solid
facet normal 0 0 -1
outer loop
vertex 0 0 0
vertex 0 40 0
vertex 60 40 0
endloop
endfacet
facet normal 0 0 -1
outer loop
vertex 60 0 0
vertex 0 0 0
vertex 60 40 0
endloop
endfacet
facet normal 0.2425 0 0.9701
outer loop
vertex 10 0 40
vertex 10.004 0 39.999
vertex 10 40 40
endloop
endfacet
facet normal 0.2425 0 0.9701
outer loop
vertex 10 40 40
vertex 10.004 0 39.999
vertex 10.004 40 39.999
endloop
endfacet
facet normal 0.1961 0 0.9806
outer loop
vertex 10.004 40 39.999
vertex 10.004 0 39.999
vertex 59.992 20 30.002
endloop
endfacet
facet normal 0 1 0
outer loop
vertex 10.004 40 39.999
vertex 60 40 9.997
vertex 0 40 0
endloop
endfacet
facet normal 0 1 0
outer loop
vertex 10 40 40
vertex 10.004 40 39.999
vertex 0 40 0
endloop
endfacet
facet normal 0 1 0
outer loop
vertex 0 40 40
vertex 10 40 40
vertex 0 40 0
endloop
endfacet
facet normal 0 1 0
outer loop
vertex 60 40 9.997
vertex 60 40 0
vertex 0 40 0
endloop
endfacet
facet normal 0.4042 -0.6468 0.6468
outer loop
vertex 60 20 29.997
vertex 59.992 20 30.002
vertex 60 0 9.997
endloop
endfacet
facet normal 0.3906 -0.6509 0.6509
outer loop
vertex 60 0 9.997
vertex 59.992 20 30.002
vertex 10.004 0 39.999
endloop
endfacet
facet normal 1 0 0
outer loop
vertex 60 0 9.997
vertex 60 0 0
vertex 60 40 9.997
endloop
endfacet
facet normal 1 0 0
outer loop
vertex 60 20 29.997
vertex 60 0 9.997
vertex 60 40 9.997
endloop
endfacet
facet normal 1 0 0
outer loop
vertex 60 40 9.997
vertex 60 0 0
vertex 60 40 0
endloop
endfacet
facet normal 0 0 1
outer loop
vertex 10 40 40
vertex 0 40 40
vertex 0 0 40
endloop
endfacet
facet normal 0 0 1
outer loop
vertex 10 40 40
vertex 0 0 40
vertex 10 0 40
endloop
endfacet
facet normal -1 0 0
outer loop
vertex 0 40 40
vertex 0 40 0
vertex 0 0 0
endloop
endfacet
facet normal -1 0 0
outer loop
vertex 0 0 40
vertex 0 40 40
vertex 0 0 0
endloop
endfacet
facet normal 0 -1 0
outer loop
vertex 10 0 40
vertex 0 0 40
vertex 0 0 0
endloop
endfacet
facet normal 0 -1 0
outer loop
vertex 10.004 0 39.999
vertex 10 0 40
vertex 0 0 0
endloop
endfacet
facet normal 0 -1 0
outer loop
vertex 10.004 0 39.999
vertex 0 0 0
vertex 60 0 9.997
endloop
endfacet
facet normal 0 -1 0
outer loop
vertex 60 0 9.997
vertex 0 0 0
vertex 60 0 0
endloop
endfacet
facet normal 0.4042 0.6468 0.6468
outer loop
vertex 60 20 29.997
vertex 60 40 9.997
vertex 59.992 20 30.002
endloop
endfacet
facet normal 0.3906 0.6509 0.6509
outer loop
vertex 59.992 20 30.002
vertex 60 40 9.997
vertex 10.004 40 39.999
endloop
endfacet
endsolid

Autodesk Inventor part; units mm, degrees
ref_plane "YZ Plane" through (0, 0, 0) normal (1, 0, 0) x (0, 1, 0)
sketch "草圖1" plane through (0, 0, 0) normal (0, 0, 1) x (1, 0, 0)
  line L0 (0, 0) -> (60, 0)
  line L1 (60, 0) -> (60, 40)
  line L2 (60, 40) -> (0, 40)
  line L3 (0, 40) -> (0, 0)
  dimension "d0" = 60
  dimension "d1" = 40
extrude "擠出1" add sketch "草圖1" along normal blind 40
chamfer "倒角1" distance 50 distance2 10 1 edges at (60, 20, 40) measured on face at (20, 26.6667, 40)
sketch "草圖2" plane through (60, 0, 0) normal (1, 0, 0) x (0, 0, -1)
  line L0 (0, 40) -> (-30, 40) projected
  line L1 (0, 0) -> (0, 40) projected
  line L2 (0, 0) -> (-30, 0) projected
  line L3 (-40, 40) -> (-40, 0) projected
  point P0 (-10, 40)
  point P1 (-10, 0)
  point P2 (-40, 20)
  dimension "d7" = 10
  dimension "d10" = 10
  dimension "d13" = 20
ref_plane "工作平面3" through (60, 40, 10) normal (-0.3906, -0.6509, -0.6509) x (0, -0.7071, 0.7071)
ref_plane "工作平面4" through (60, 20, 30) normal (-0.3906, 0.6509, -0.6509) x (0, -0.7071, -0.7071)
sketch "草圖5" plane through (60, 40, 10) normal (-0.3906, -0.6509, -0.6509) x (0, -0.7071, 0.7071)
  line L0 (-21.2028, 86.012) -> (46.7944, 86.012)
  line L1 (46.7944, 86.012) -> (46.7944, -28.5442)
  line L2 (46.7944, -28.5442) -> (-21.2028, -28.5442)
  line L3 (-21.2028, -28.5442) -> (-21.2028, 86.012)
  point P0 (21.2132, 41.4259)
extrude "擠出4" cut sketch "草圖5" against normal blind 40
sketch "草圖6" plane through (60, 20, 30) normal (-0.3906, 0.6509, -0.6509) x (0, -0.7071, -0.7071)
  line L0 (-21.2652, 80.224) -> (44.7592, 80.224)
  line L1 (44.7592, 80.224) -> (44.7592, -31.1757)
  line L2 (44.7592, -31.1757) -> (-21.2652, -31.1757)
  line L3 (-21.2652, -31.1757) -> (-21.2652, 80.224)
  point P0 (35.3553, 52.4728)
extrude "擠出5" cut sketch "草圖6" against normal blind 40
